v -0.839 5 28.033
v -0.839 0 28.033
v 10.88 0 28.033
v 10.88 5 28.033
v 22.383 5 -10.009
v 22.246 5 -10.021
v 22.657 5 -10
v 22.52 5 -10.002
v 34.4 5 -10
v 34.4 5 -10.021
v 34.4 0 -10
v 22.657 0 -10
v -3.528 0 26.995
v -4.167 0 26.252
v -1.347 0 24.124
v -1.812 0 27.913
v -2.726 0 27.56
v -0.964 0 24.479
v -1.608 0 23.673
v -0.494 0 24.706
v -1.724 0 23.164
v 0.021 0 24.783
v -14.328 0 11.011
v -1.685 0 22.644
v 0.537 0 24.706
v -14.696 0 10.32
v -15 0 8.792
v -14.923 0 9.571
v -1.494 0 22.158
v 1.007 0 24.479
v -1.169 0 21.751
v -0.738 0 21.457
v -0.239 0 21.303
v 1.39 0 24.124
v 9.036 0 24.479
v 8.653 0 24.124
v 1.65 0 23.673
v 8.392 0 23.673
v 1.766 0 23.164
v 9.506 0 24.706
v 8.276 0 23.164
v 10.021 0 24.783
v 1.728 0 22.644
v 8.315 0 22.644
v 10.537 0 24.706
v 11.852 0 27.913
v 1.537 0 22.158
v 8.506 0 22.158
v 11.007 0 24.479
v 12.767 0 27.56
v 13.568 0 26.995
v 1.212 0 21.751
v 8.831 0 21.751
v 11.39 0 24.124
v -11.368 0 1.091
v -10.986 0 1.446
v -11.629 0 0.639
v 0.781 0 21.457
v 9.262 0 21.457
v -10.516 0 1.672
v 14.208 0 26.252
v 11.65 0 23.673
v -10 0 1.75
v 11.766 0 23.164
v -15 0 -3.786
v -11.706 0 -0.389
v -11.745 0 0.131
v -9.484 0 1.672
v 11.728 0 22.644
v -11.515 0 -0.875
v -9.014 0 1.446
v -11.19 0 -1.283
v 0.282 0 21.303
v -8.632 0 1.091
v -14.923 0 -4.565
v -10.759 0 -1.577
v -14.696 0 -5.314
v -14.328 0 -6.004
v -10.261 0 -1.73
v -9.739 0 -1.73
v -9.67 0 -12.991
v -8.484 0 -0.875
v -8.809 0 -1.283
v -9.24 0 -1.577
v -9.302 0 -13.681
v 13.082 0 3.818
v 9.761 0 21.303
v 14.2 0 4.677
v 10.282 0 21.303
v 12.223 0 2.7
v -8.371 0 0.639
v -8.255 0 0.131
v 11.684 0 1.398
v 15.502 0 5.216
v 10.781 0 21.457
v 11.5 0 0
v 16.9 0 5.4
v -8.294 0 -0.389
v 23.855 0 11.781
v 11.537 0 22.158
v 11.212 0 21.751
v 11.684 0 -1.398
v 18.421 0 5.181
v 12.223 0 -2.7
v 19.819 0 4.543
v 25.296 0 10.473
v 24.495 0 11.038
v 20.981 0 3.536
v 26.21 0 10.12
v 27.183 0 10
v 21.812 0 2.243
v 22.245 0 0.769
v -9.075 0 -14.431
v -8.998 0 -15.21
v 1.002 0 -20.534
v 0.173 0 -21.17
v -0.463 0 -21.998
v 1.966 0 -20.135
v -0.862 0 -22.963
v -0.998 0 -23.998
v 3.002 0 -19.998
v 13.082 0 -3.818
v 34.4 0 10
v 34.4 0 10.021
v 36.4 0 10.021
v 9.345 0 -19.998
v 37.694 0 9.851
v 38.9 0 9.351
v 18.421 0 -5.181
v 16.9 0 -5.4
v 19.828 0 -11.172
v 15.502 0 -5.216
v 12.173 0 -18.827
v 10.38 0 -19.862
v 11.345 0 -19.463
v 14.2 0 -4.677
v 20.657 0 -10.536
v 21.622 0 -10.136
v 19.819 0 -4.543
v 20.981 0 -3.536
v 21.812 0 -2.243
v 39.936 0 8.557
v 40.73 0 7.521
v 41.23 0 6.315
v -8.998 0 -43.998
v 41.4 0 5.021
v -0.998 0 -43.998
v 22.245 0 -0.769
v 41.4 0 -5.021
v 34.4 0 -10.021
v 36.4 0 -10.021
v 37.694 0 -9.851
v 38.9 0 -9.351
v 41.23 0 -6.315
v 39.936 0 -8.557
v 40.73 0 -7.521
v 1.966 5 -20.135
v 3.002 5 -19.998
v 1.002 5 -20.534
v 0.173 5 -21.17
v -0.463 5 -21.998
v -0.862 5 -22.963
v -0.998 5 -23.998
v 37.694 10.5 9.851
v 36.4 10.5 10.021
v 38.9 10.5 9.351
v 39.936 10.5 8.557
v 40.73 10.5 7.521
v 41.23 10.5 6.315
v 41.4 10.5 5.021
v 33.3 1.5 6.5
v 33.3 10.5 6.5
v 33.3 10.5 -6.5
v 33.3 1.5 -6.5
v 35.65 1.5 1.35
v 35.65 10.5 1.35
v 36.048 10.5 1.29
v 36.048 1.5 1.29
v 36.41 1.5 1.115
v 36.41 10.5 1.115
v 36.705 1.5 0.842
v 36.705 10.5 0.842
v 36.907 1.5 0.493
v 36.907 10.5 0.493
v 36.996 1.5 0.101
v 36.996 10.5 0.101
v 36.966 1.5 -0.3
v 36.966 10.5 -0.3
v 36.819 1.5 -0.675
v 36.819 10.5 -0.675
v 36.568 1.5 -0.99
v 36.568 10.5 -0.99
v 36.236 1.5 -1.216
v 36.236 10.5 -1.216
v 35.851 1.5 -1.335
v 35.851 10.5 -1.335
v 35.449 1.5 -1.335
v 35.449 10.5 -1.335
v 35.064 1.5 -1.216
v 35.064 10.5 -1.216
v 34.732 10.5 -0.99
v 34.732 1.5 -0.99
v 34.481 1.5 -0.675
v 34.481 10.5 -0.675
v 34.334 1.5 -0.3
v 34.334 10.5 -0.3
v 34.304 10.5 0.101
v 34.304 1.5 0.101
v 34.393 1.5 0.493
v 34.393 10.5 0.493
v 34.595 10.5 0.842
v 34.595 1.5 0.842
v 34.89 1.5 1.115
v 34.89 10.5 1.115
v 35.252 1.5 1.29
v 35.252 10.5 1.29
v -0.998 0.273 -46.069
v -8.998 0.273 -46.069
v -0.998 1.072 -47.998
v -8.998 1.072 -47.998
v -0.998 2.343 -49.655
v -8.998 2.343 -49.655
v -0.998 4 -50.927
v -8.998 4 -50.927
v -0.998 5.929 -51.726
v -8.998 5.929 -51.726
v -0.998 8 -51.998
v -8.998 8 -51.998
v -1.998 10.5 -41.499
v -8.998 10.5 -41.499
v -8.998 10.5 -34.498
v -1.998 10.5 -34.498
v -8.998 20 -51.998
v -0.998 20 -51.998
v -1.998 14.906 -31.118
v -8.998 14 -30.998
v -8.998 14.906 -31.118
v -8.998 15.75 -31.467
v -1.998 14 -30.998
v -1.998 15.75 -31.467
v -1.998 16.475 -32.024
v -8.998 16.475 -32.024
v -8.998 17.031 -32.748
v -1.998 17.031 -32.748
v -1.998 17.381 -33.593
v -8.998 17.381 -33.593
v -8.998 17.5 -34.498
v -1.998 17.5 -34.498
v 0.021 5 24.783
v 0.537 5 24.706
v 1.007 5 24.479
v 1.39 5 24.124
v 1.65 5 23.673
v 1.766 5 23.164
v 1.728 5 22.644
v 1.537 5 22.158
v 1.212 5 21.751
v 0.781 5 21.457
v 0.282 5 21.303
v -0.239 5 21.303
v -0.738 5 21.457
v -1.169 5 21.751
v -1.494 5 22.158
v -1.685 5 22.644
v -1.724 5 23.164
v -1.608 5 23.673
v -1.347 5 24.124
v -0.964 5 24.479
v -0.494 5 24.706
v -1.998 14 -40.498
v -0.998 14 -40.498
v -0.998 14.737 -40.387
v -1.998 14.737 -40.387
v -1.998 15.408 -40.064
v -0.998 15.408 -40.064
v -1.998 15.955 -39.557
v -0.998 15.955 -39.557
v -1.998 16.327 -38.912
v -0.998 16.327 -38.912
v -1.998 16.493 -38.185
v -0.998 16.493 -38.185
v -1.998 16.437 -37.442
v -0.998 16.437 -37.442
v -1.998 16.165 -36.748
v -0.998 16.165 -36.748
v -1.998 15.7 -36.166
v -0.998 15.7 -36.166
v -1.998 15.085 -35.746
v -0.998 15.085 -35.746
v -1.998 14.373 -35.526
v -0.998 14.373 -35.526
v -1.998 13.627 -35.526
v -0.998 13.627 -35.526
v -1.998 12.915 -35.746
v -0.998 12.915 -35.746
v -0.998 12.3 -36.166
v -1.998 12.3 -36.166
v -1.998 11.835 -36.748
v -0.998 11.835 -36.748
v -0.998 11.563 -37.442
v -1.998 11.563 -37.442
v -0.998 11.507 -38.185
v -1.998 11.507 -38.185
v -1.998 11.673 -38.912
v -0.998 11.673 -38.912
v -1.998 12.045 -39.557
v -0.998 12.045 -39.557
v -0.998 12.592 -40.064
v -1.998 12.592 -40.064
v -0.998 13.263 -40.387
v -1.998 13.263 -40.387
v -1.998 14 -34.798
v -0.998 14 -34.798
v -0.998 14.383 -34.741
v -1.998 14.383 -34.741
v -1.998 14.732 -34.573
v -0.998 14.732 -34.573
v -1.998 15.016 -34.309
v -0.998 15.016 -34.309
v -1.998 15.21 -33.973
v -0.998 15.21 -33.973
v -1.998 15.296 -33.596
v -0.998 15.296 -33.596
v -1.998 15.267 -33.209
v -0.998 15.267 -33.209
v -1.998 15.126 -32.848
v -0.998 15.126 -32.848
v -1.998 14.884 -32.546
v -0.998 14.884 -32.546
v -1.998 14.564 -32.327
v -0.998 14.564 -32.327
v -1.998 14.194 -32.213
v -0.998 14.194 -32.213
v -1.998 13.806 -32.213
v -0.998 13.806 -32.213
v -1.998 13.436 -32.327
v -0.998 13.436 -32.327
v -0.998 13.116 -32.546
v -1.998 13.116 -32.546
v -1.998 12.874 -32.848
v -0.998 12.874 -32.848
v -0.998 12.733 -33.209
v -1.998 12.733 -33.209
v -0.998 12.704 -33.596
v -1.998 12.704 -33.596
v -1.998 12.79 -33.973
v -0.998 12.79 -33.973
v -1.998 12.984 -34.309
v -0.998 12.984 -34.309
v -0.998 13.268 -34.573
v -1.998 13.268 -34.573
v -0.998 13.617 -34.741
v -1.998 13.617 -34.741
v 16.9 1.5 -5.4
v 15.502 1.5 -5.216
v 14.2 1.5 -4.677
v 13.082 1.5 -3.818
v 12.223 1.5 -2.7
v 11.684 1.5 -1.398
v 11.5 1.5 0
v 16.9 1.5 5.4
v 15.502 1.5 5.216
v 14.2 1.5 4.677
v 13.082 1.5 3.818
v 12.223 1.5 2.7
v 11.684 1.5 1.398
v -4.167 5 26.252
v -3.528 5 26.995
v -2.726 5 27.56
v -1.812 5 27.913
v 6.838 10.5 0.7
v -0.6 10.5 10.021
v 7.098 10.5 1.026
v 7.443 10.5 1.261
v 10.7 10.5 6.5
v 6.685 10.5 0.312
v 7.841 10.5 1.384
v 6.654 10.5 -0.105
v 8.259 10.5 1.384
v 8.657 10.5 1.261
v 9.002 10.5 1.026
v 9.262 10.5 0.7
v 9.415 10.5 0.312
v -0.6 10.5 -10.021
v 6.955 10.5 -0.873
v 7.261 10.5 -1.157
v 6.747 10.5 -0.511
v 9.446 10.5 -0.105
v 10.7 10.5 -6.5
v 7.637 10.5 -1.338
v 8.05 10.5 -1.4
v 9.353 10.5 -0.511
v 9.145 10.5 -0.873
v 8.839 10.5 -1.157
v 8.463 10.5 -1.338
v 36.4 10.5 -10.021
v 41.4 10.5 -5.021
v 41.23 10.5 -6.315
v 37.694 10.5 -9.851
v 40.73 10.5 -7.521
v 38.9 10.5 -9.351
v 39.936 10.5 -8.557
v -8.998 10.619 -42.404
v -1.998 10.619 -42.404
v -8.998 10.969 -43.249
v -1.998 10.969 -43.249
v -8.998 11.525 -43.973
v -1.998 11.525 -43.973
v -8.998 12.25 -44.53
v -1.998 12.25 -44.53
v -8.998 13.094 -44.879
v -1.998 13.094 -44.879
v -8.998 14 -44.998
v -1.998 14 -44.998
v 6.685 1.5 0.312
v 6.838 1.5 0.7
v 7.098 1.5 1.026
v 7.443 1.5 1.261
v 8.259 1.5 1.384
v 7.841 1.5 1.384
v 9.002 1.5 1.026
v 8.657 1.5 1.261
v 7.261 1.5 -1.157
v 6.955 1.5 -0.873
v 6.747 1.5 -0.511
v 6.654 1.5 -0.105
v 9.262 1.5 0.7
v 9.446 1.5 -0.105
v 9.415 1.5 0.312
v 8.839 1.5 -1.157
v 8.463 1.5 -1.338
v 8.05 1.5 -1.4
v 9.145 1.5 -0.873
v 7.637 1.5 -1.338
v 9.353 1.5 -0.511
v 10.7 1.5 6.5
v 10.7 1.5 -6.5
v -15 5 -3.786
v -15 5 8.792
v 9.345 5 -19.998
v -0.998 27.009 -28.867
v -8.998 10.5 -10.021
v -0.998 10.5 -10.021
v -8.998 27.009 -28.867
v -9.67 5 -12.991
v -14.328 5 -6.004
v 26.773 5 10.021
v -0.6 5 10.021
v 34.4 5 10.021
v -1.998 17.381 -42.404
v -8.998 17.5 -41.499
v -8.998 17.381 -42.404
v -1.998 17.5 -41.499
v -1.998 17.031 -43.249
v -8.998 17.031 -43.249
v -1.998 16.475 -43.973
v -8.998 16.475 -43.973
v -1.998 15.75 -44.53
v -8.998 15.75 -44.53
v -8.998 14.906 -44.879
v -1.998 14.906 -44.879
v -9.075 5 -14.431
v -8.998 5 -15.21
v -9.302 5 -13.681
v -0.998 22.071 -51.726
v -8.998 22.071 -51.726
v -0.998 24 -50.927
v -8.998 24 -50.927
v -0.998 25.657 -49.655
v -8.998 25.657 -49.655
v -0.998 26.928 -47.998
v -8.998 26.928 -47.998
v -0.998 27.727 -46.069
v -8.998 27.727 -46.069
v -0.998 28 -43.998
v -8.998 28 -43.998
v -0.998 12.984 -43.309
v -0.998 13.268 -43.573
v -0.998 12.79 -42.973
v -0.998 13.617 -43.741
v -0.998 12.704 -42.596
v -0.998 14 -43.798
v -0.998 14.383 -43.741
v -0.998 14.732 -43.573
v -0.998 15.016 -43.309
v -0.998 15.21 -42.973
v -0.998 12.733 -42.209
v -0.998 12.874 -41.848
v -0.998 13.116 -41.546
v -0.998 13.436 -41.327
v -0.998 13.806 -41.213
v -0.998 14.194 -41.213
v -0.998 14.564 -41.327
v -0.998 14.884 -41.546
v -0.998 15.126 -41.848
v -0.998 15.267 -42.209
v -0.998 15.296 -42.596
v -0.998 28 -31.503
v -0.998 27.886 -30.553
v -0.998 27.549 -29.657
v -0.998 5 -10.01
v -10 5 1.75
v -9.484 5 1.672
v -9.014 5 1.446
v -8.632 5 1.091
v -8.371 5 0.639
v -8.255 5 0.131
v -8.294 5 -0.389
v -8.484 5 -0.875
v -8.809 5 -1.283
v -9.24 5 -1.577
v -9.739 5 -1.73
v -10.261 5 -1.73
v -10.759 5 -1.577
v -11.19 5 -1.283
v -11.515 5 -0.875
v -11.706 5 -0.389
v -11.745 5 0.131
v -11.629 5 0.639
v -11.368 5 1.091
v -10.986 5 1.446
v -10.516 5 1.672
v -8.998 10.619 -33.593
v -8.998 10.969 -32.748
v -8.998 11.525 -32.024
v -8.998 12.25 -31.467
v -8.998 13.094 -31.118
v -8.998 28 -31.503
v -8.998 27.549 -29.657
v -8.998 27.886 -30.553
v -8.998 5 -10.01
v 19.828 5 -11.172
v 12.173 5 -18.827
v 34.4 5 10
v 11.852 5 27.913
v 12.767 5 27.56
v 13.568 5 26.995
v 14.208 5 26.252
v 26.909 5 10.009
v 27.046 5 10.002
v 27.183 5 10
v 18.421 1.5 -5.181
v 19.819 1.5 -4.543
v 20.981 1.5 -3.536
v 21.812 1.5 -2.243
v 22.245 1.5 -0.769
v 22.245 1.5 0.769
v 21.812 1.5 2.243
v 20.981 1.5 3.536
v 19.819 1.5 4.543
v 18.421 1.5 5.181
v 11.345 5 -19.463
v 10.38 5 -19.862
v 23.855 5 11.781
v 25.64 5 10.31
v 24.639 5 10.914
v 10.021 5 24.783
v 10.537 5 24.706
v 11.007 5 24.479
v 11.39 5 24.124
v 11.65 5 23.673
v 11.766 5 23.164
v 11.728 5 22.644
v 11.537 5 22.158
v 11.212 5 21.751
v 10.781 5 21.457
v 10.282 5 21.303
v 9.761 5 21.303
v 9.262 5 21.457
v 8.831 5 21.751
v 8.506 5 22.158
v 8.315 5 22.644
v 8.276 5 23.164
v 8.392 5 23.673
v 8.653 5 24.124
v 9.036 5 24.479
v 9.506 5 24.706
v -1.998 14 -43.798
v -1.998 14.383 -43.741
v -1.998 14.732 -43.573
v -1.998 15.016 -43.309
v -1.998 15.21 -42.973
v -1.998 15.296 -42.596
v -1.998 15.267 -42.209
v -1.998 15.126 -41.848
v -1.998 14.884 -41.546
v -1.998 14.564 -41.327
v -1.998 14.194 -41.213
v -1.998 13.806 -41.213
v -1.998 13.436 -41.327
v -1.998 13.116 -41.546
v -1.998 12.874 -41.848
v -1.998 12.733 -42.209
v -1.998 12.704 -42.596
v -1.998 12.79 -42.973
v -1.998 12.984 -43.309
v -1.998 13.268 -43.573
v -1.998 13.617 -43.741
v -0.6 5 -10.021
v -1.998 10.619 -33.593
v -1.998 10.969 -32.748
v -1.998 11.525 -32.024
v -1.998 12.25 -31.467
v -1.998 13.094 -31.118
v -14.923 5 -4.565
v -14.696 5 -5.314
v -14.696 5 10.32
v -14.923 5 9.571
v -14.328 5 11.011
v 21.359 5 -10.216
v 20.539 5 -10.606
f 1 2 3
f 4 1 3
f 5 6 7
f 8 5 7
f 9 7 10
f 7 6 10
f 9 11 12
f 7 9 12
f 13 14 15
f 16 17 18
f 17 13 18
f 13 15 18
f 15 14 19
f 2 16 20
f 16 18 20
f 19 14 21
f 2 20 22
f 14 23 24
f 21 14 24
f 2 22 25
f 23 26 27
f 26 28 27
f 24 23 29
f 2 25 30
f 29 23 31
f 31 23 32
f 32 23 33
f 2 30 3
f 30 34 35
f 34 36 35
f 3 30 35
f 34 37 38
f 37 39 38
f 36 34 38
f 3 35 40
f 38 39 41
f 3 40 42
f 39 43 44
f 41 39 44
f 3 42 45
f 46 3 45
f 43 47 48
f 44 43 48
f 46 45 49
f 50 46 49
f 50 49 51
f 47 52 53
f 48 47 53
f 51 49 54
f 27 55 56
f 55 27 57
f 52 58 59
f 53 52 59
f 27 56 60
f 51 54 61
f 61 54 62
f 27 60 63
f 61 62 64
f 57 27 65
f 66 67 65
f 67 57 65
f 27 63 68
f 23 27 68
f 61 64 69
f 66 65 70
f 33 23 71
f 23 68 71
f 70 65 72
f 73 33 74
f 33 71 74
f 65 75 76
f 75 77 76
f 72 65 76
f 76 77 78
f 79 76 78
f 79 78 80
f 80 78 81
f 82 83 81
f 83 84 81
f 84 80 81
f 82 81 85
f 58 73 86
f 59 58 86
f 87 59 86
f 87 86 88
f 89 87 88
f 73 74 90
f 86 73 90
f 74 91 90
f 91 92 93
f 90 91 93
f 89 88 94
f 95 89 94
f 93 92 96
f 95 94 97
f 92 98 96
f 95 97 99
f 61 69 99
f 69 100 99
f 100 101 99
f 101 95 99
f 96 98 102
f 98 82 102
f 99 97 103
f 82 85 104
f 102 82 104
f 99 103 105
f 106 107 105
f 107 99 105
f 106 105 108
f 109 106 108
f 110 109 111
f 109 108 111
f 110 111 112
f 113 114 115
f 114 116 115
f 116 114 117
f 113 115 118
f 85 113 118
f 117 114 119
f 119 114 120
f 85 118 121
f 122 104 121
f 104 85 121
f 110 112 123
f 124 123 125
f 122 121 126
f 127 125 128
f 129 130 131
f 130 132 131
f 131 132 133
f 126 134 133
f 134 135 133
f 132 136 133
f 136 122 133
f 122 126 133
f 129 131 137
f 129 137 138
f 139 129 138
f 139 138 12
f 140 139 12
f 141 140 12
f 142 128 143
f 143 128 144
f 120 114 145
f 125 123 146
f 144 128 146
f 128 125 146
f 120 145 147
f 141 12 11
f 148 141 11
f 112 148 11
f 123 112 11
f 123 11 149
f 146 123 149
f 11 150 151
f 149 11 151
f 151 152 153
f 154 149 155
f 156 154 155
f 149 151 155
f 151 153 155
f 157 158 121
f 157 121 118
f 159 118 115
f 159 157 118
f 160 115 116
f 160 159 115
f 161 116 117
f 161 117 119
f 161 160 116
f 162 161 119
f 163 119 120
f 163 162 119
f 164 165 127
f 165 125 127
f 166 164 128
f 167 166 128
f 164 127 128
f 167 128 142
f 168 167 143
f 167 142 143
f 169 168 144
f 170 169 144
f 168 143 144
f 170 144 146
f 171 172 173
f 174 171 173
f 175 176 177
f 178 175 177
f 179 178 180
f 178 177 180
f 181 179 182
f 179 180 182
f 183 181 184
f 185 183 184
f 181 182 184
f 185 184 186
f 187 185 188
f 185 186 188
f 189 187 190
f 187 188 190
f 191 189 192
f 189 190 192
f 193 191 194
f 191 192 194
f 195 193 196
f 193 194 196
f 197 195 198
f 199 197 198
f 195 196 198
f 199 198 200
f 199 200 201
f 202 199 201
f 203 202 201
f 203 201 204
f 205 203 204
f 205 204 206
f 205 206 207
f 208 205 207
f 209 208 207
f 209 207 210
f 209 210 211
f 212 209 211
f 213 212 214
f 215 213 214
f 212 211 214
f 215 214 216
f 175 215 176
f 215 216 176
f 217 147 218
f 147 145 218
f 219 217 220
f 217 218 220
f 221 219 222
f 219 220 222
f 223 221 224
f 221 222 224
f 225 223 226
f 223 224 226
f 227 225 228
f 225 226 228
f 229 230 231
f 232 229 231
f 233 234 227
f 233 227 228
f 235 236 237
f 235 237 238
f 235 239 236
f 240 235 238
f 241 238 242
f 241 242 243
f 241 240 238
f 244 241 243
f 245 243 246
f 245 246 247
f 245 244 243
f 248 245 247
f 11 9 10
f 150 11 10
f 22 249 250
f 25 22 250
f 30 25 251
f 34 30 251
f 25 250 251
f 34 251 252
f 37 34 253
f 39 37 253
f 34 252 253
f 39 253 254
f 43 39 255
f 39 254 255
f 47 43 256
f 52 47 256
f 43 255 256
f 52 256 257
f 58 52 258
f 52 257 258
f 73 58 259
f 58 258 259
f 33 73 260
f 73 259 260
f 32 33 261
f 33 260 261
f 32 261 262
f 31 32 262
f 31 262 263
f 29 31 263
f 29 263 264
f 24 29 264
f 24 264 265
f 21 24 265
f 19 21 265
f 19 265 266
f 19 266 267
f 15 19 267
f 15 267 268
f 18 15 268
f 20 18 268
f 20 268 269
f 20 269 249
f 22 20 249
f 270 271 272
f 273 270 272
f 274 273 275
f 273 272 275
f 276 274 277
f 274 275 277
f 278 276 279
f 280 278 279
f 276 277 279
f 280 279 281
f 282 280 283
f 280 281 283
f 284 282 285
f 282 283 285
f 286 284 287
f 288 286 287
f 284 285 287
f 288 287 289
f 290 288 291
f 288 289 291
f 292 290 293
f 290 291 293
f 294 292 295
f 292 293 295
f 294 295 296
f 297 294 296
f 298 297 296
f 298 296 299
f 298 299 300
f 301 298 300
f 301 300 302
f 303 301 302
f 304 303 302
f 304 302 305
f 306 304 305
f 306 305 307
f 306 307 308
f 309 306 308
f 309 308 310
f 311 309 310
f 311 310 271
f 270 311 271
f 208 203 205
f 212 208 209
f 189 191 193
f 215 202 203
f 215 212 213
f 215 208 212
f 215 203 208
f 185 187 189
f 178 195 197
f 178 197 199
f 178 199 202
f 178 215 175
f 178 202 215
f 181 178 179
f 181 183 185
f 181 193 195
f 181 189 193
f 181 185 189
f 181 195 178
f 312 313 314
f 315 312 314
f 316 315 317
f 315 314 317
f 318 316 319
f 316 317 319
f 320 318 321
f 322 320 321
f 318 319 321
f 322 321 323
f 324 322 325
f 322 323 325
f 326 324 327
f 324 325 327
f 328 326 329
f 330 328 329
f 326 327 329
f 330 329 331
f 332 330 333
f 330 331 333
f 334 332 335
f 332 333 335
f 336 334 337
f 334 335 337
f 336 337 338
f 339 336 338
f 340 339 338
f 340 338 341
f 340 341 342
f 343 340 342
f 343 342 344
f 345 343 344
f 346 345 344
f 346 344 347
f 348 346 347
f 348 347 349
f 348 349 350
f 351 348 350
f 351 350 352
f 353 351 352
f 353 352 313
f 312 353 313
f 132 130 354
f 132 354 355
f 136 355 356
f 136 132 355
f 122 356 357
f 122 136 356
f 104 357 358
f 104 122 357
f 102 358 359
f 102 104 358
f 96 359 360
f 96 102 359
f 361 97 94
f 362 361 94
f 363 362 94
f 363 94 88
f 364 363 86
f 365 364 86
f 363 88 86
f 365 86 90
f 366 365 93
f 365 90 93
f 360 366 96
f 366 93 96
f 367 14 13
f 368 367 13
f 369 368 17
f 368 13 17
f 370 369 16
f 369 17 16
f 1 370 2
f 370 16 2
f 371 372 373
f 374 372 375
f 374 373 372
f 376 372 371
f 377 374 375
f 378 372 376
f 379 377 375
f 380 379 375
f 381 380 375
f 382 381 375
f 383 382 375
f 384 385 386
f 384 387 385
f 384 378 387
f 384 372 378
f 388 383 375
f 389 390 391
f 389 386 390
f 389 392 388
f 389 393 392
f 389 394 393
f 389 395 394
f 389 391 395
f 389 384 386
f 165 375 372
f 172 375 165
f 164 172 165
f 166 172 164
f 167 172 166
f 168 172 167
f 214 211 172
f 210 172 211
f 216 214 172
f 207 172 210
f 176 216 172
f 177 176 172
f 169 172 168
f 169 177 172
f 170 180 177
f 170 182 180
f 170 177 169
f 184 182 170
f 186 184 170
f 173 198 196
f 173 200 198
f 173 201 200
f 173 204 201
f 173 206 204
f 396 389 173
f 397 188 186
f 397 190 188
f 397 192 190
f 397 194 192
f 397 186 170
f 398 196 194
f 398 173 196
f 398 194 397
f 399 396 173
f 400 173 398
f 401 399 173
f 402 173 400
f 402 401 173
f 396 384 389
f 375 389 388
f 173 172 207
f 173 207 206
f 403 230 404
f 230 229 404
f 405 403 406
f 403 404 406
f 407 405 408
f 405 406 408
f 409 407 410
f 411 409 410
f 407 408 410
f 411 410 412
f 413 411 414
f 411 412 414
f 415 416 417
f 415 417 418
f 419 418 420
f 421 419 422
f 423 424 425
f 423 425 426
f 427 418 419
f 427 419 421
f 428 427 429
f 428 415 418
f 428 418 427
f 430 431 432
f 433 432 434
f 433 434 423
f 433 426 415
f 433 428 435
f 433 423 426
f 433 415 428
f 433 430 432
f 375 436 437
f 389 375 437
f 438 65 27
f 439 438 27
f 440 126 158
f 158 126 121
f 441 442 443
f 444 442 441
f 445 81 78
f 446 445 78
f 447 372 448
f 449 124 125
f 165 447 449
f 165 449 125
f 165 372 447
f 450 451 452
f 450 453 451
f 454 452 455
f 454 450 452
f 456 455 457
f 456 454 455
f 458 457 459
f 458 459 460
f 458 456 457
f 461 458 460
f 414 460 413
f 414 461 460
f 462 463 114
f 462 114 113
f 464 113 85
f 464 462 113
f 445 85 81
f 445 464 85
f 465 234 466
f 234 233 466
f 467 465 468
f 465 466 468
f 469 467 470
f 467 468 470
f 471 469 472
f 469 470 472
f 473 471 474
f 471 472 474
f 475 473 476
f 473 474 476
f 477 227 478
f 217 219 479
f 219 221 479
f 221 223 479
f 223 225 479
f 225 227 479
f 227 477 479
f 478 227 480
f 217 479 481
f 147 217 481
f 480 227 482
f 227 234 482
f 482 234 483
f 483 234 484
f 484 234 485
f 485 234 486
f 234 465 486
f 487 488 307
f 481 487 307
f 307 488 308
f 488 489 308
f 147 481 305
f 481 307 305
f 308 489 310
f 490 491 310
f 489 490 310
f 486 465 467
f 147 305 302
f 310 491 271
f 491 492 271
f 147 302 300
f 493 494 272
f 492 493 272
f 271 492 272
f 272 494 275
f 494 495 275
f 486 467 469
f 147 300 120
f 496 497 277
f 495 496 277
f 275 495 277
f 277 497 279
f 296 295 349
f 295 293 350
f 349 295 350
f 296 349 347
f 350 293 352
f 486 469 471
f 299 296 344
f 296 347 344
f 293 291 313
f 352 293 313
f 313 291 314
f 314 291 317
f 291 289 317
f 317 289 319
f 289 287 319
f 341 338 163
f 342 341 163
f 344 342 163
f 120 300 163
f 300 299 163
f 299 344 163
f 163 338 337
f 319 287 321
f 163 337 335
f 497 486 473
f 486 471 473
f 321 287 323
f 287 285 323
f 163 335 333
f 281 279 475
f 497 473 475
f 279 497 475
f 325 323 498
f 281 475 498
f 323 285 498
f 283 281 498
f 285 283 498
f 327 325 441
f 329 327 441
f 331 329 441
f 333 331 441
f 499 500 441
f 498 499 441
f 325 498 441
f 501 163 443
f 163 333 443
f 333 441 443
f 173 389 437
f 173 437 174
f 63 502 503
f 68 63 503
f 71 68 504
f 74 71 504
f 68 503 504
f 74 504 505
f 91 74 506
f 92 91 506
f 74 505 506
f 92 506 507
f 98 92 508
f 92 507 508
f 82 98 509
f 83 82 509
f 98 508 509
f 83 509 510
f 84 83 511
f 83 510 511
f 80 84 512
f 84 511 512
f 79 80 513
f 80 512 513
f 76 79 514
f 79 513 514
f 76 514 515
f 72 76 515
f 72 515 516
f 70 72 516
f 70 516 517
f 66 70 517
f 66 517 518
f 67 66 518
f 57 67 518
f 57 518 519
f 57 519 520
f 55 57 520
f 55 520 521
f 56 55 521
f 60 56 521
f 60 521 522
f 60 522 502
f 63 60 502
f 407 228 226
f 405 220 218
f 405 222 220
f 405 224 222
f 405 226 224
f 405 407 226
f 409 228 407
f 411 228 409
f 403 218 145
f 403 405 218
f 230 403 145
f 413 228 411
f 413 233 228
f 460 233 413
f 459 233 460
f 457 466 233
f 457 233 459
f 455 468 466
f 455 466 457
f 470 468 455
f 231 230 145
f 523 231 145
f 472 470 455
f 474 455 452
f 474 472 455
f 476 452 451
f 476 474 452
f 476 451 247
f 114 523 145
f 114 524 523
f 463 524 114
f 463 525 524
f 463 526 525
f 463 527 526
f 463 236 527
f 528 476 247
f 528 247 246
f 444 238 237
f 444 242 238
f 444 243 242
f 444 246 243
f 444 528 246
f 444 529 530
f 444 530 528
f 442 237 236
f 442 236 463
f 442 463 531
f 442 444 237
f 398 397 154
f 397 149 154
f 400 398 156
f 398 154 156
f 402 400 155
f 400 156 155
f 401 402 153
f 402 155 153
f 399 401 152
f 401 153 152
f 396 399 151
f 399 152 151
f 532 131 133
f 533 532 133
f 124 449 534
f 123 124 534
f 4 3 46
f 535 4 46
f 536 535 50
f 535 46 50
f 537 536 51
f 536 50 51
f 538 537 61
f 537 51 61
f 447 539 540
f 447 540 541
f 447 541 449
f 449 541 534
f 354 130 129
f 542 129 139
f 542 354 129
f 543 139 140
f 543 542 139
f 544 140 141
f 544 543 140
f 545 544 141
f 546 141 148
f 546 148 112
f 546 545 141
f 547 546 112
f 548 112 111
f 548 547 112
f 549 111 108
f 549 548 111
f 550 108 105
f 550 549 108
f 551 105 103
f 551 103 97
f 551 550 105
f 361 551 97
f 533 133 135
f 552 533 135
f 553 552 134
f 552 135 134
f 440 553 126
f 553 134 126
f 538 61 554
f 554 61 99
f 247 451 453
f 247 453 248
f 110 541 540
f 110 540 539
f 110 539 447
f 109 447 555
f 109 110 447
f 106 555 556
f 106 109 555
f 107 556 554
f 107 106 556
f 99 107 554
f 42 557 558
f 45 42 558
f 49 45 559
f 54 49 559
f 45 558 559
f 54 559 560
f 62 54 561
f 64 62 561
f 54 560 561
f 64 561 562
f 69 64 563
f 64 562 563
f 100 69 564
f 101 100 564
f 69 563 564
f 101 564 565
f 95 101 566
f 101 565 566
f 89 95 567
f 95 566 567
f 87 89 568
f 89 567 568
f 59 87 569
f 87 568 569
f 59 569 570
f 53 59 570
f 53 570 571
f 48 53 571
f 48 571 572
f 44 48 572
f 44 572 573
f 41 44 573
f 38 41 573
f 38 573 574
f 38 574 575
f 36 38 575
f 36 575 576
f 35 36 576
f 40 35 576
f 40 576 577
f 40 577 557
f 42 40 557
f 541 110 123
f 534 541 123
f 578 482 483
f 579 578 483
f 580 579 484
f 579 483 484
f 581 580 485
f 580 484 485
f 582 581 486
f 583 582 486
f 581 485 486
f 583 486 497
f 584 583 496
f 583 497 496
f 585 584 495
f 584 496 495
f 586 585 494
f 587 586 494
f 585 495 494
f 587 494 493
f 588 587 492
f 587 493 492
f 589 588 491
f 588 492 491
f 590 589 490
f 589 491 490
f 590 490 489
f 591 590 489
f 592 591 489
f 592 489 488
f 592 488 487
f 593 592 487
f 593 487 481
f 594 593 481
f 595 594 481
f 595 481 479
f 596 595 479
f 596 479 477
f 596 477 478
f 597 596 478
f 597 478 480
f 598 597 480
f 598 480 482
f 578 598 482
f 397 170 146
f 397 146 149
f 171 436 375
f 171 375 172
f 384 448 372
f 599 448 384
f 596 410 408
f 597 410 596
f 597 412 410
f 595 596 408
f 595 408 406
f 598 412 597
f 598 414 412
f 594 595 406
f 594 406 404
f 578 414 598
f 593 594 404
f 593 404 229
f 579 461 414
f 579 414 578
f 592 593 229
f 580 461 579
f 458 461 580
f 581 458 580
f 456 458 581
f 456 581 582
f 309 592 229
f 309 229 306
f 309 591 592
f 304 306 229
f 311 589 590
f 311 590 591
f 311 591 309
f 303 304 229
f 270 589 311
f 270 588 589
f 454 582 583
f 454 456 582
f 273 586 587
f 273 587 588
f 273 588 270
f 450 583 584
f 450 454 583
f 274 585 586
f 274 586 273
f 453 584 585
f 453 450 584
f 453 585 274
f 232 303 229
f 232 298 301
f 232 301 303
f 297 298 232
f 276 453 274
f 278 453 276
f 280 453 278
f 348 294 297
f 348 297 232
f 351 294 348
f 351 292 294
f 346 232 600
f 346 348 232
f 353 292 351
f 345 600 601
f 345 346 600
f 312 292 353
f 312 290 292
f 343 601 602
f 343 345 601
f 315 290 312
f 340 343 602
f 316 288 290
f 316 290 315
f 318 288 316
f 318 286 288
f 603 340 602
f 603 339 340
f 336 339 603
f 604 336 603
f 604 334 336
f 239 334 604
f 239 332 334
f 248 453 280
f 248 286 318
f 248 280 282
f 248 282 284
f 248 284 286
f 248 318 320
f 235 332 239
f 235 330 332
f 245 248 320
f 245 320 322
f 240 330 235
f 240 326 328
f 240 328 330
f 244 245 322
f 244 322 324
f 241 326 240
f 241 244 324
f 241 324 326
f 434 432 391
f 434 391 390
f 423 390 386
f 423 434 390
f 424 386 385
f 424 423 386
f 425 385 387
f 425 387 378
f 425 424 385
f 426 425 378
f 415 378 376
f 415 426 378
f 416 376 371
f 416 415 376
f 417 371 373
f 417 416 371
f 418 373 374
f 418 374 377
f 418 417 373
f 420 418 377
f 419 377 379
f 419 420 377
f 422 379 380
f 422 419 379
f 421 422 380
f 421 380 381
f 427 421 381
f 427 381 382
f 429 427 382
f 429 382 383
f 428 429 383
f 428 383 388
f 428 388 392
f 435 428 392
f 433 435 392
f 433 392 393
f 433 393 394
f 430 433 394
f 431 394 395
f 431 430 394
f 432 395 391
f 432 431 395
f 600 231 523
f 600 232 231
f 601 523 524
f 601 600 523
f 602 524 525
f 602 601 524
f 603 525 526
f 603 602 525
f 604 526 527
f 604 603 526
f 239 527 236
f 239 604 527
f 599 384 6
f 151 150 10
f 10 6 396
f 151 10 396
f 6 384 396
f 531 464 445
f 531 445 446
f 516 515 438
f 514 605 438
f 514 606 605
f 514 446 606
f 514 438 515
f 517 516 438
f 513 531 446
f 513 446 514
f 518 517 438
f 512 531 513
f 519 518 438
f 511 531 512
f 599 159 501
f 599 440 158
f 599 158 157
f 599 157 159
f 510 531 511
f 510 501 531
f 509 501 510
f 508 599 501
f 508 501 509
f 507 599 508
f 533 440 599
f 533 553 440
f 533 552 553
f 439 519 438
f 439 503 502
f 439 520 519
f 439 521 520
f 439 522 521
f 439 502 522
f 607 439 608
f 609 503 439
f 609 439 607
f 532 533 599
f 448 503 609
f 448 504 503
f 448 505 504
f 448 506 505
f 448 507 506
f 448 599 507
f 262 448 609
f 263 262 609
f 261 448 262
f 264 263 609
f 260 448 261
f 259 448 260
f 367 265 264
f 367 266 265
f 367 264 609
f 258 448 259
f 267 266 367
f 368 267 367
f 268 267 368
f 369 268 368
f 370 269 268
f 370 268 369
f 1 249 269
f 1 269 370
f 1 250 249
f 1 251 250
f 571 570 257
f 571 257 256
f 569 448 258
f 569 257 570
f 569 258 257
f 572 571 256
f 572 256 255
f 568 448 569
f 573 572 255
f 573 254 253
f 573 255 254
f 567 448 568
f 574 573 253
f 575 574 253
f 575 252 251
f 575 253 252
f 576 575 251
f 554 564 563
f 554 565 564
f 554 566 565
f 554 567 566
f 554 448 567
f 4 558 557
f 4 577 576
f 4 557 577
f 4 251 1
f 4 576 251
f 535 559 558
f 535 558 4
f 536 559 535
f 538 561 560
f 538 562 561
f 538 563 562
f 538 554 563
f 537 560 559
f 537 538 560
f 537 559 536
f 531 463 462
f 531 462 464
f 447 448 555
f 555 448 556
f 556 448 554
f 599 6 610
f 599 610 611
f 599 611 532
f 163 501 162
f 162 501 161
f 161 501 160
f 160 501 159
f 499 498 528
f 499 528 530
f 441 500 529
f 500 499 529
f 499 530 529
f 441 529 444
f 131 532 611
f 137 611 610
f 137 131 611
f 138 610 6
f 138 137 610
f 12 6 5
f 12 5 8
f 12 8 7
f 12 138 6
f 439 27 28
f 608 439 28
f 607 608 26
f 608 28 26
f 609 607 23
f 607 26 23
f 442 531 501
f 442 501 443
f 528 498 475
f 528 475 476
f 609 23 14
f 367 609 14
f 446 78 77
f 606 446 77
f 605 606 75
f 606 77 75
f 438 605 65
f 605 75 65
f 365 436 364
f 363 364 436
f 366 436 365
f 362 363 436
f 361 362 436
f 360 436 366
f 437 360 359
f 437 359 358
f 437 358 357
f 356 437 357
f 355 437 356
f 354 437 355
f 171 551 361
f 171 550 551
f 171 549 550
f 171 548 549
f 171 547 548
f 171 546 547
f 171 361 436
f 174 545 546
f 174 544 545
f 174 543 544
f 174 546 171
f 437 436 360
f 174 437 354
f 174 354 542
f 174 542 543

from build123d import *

# Parameters (mm, degrees)
BOSS_EXTRUDE1_DEPTH = 5
SKETCH2_R           = 1.75
SKETCH2_W           = 10.8
SKETCH2_H           = 10.8
CUT_EXTRUDE1_DEPTH  = 54.252895531
FILLET1_R           = 5.4
FILLET2_R           = 5.4
FILLET3_RADIUS      = 10
FILLET3_LENGTH      = 5
SKETCH6_W           = 35
SKETCH6_H           = 20.042215846
SKETCH6_W_2         = 23
SKETCH6_H_2         = 13
BOSS_EXTRUDE3_DEPTH = 5.5
SKETCH7_W           = 23
SKETCH7_H           = 13
CUT_EXTRUDE3_DEPTH  = 3.5
CUT_EXTRUDE4_DEPTH  = 54.302165833
SKETCH9_W           = 8
SKETCH9_H           = 28
BOSS_EXTRUDE4_DEPTH = 32
SKETCH11_R          = 2.5
SKETCH11_R_2        = 1.3
CUT_EXTRUDE5_DEPTH  = 69.854164991
FILLET6_R           = 8
BOSS_EXTRUDE5_DEPTH = 8
SKETCH13_W          = 14
SKETCH13_H          = 7
CUT_EXTRUDE6_DEPTH  = 7
FILLET7_R           = 3.5
FILLET8_R           = 3.5
CUT_EXTRUDE7_DEPTH  = 74.28896148
FILLET9_R           = 4
SKETCH15_W          = 5.3
SKETCH15_H          = 13
SKETCH15_R          = 1.4
BOSS_EXTRUDE6_DEPTH = 9
SKETCH16_W          = 7
SKETCH16_H          = 20.042215846
BOSS_EXTRUDE7_DEPTH = 10.5
SKETCH17_R          = 1.35
CUT_EXTRUDE8_DEPTH  = 9
FILLET10_R          = 5
SKETCH18_W          = 4.9
SKETCH18_H          = 13
CUT_EXTRUDE9_DEPTH  = 9


# Some blends are built 0.0001 mm under size
with BuildPart() as part:
    # Sketch1 → Boss-Extrude1 (new body)
    with BuildSketch(Plane(origin=(0, 0, 0), x_dir=(1, 0, 0), z_dir=(0, 1, 0))):
        Polygon((45, -10), (45, 10), (21, 10), (11.001510114, 19.998489886), (-4.998489886, 19.998489886), (-14.999716743, 4.996611292), (-14.999716743, -10.003388708), (-2.979747437, -28.033388708), (13.020252563, -28.033388708), (25.042481003, -10), align=None)
    extrude(amount=BOSS_EXTRUDE1_DEPTH)

    # Sketch2 → Cut-Extrude1 (cut, through all)
    with BuildSketch(Plane(origin=(0, 5, 0), x_dir=(1, 0, 0), z_dir=(0, 1, 0))):
        with Locations(Location((-9.999716743, 0, 0), (0, 0, 270))):
            Circle(SKETCH2_R)
        with Locations(Location((0.02138213, -23.033388708, 0), (0, 0, 270))):
            Circle(SKETCH2_R)
        with Locations(Location((10.02138213, -23.033388708, 0), (0, 0, 270))):
            Circle(SKETCH2_R)
        with Locations((16.9, 0)):
            Rectangle(SKETCH2_W, SKETCH2_H)
    extrude(amount=-CUT_EXTRUDE1_DEPTH, mode=Mode.SUBTRACT)

    # Fillet1
    fillet1_edges = [part.edges().sort_by_distance(p)[0] for p in [
        (11.5, 2.5, 5.4),
        (11.5, 2.5, -5.4),
    ]]
    fillet(fillet1_edges, radius=FILLET1_R - 0.0001)  # a hair under: the kernel refuses the full size

    # Fillet2
    # the kernel refuses this fillet: 5.4 mm, written as the material it adds along each edge
    with BuildSketch(Plane(origin=(22.3, 5, 5.4), x_dir=(-1, 0, 0), z_dir=(0, -1, 0)), Plane(origin=(22.3, 5, -5.4), x_dir=(0, 0, 1), z_dir=(0, -1, 0))) as fillet2_piece_1:
        with BuildLine():
            CenterArc((FILLET2_R, FILLET2_R), FILLET2_R, 180, 90)
            Line((0, FILLET2_R), (0, 0))
            Line((0, 0), (FILLET2_R, 0))
        make_face()
    extrude(amount=5)
    # the kernel refuses this fillet: 5.4 mm, written as the material it takes off along each edge

    # Fillet3: full round fillet: the end face becomes a half cylinder, R = half its width
    fillet3_face = Plane((45, 2.5, 0), x_dir=(0, 1, 0), z_dir=(1, 0, 0))  # on the end face: x along it, z out of the body
    fillet3_slab = fillet3_face.offset(-FILLET3_RADIUS / 2) * Box(FILLET3_LENGTH, 2 * FILLET3_RADIUS, FILLET3_RADIUS, mode=Mode.PRIVATE)  # the body's end, R deep
    fillet3_round = Plane((35, 2.5, 0), x_dir=(1, 0, 0), z_dir=(0, 1, 0)) * Cylinder(FILLET3_RADIUS, FILLET3_LENGTH, mode=Mode.PRIVATE)  # its axis R under the face
    add(fillet3_slab - fillet3_round, mode=Mode.SUBTRACT)

    # Sketch6 → Boss-Extrude3 (add)
    with BuildSketch(Plane(origin=(0, 5, 0), x_dir=(1, 0, 0), z_dir=(0, 1, 0))):
        with Locations((16.9, 0)):
            Rectangle(SKETCH6_W, SKETCH6_H)
        with Locations((16.9, 0)):
            Rectangle(SKETCH6_W_2, SKETCH6_H_2, mode=Mode.SUBTRACT)
    extrude(amount=BOSS_EXTRUDE3_DEPTH)

    # Sketch7 → Cut-Extrude3 (cut)
    with BuildSketch(Plane(origin=(0, 5, 0), x_dir=(1, 0, 0), z_dir=(0, 1, 0))):
        with Locations((16.9, 0)):
            Rectangle(SKETCH7_W, SKETCH7_H)
    extrude(amount=-CUT_EXTRUDE3_DEPTH, mode=Mode.SUBTRACT)

    # Sketch8 → Cut-Extrude4 (cut, through all)
    with BuildSketch(Plane(origin=(0, 5, 0), x_dir=(1, 0, 0), z_dir=(0, 1, 0))):
        with BuildLine():
            Line((34.4, 10), (34.4, -10))
            Line((34.4, -10), (35, -10))
            ThreePointArc((35, -10), (45, 0), (35, 10))
            Line((35, 10), (34.4, 10))
        make_face()
    extrude(amount=-CUT_EXTRUDE4_DEPTH, mode=Mode.SUBTRACT)

    # Sketch9 → Boss-Extrude4 (add)
    with BuildSketch(Plane(origin=(0, 0, -19.998489886), x_dir=(-1, 0, 0), z_dir=(0, 0, -1))):
        with Locations((4.998489886, 14)):
            Rectangle(SKETCH9_W, SKETCH9_H)
    extrude(amount=BOSS_EXTRUDE4_DEPTH)

    # Sketch11 → Cut-Extrude5 (cut, through all)
    with BuildSketch(Plane(origin=(-0.998489886, 0, 0), x_dir=(0, 0, -1), z_dir=(1, 0, 0))):
        with Locations((37.998489886, 14)):
            Circle(SKETCH11_R)
        with Locations((33.498489886, 14)):
            Circle(SKETCH11_R_2)
        with Locations((42.498489886, 14)):
            Circle(SKETCH11_R_2)
    extrude(amount=-CUT_EXTRUDE5_DEPTH, mode=Mode.SUBTRACT)

    # Fillet6
    fillet6_edges = [part.edges().sort_by_distance(p)[0] for p in [
        (-4.998489886, 0, -51.998489886),
        (-4.998489886, 28, -51.998489886),
    ]]
    fillet(fillet6_edges, radius=FILLET6_R)

    # Sketch12 → Boss-Extrude5 (add)
    with BuildSketch(Plane.ZY.offset(8.998489886)):
        Polygon((-10.021107923, 10.5), (-19.998489886, 28), (-19.998489886, 0), (-10, 0), align=None)
    extrude(amount=-BOSS_EXTRUDE5_DEPTH)

    # Sketch13 → Cut-Extrude6 (cut)
    with BuildSketch(Plane.ZY.offset(8.998489886)):
        with Locations((-37.998489886, 14)):
            Rectangle(SKETCH13_W, SKETCH13_H)
    extrude(amount=-CUT_EXTRUDE6_DEPTH, mode=Mode.SUBTRACT)

    # Fillet7
    fillet7_edges = [part.edges().sort_by_distance(p)[0] for p in [
        (-5.498489886, 10.5, -44.998489886),
        (-5.498489886, 17.5, -44.998489886),
    ]]
    fillet(fillet7_edges, radius=FILLET7_R - 0.0001)  # a hair under: the kernel refuses the full size

    # Fillet8
    fillet8_edges = [part.edges().sort_by_distance(p)[0] for p in [
        (-5.498489886, 17.5, -30.998489886),
        (-5.498489886, 10.5, -30.998489886),
    ]]
    fillet(fillet8_edges, radius=FILLET8_R - 0.0001)  # a hair under: the kernel refuses the full size

    # Sketch14 → Cut-Extrude7 (cut, through all)
    with BuildSketch(Plane.ZY.offset(8.998489886)):
        Polygon((-10.021107923, 10.5), (-29.998489886, 28), (-19.998489886, 28), align=None)
    extrude(amount=-CUT_EXTRUDE7_DEPTH, mode=Mode.SUBTRACT)

    # Fillet9
    # the kernel refuses this fillet: 4 mm, written as the material it adds along each edge
    with BuildSketch(Plane(origin=(-0.998489886, 5, -19.998489886), x_dir=(1, 0, 0), z_dir=(0, -1, 0))) as fillet9_piece_1:
        with BuildLine():
            CenterArc((FILLET9_R, -FILLET9_R), FILLET9_R, 90, 90)
            Line((0, -FILLET9_R), (0, 0))
            Line((0, 0), (FILLET9_R, 0))
        make_face()
    extrude(amount=5)
    with BuildSketch(Plane(origin=(25.042481003, 0, 10), x_dir=(-0.5546992156114033, 0, 0.8320509480795595), z_dir=(0, 1, 0))) as fillet9_piece_2:
        with BuildLine():
            CenterArc((FILLET9_R * 0.535184516545, FILLET9_R), FILLET9_R, 213.69, 56.31)
            Line((-FILLET9_R * 0.296866431535, FILLET9_R * 0.445300784389), (0, 0))
            Line((0, 0), (FILLET9_R * 0.535184516545, 0))
        make_face()
    extrude(amount=5)
    with BuildSketch(Plane(origin=(21, 0, -10), x_dir=(1, 0, 0), z_dir=(0, 1, 0))) as fillet9_piece_3:
        with BuildLine():
            CenterArc((FILLET9_R * 0.414213562373, FILLET9_R), FILLET9_R, 225, 45)
            Line((-FILLET9_R * 0.292893218813, FILLET9_R * 0.292893218813), (0, 0))
            Line((0, 0), (FILLET9_R * 0.414213562373, 0))
        make_face()
    extrude(amount=5)
    with BuildSketch(Plane(origin=(-8.998489886, 5, -13.998474565), x_dir=(0, 0, -1), z_dir=(0, -1, 0))) as fillet9_piece_4:
        with BuildLine():
            CenterArc((FILLET9_R * 0.302774994436, -FILLET9_R), FILLET9_R, 90, 33.69)
            Line((-FILLET9_R * 0.251924221175, -FILLET9_R * 0.16794905192), (0, 0))
            Line((0, 0), (FILLET9_R * 0.302774994436, 0))
        make_face()
    extrude(amount=5)
    # the kernel refuses this fillet: 4 mm, written as the material it takes off along each edge
    with BuildSketch(Plane(origin=(13.020252563, -5.351845165, 28.033388708), x_dir=(0.5546992156114035, 0, -0.8320509480795594), z_dir=(0, 1, 0)), Plane(origin=(-2.979747437, -5.351845165, 28.033388708), x_dir=(1, 0, 0), z_dir=(0, 1, 0))) as fillet9_2_piece_1:
        with BuildLine():
            CenterArc((FILLET9_R * 0.535184516545, FILLET9_R), FILLET9_R, 213.69, 56.31)
            Line((-FILLET9_R * 0.296866431535, FILLET9_R * 0.445300784389), (0, 0))
            Line((0, 0), (FILLET9_R * 0.535184516545, 0))
        make_face()
    extrude(amount=15.703690331, mode=Mode.SUBTRACT)
    with BuildSketch(Plane(origin=(-14.999716743, -3.027749944, 10.003388708), x_dir=(0.5546992156114036, 0, 0.8320509480795593), z_dir=(0, 1, 0)), Plane(origin=(-14.999716743, -3.027749944, -4.996611292), x_dir=(0, 0, 1), z_dir=(0, 1, 0))) as fillet9_2_piece_2:
        with BuildLine():
            CenterArc((FILLET9_R * 0.302774994436, FILLET9_R), FILLET9_R, 236.31, 33.69)
            Line((-FILLET9_R * 0.251924221175, FILLET9_R * 0.16794905192), (0, 0))
            Line((0, 0), (FILLET9_R * 0.302774994436, 0))
        make_face()
    extrude(amount=11.055499889, mode=Mode.SUBTRACT)
    with BuildSketch(Plane(origin=(11.001510114, -4.142135624, -19.998489886), x_dir=(-1, 0, 0), z_dir=(0, 1, 0))) as fillet9_2_piece_3:
        with BuildLine():
            CenterArc((FILLET9_R * 0.414213562373, FILLET9_R), FILLET9_R, 225, 45)
            Line((-FILLET9_R * 0.292893218813, FILLET9_R * 0.292893218813), (0, 0))
            Line((0, 0), (FILLET9_R * 0.414213562373, 0))
        make_face()
    extrude(amount=13.284271247, mode=Mode.SUBTRACT)
    with BuildSketch(Plane(origin=(-12.759041279, 28, -29.998489886), x_dir=(0, -0.658926553885557, 0.7522072829908683), z_dir=(1, 0, 0))) as fillet9_2_piece_4:
        with BuildLine():
            CenterArc((FILLET9_R * 0.376055139299, FILLET9_R), FILLET9_R, 228.781943012, 41.218056988)
            Line((-FILLET9_R * 0.282871414587, FILLET9_R * 0.247792717009), (0, 0))
            Line((0, 0), (FILLET9_R * 0.376055139299, 0))
        make_face()
    extrude(amount=15.521102786, mode=Mode.SUBTRACT)

    # Sketch15 → Boss-Extrude6 (add)
    with BuildSketch(Plane(origin=(0, 1.5, 0), x_dir=(1, 0, 0), z_dir=(0, 1, 0))):
        with Locations((8.05, 0)):
            Rectangle(SKETCH15_W, SKETCH15_H)
        with Locations(Location((8.05, 0, 0), (0, 0, 90))):
            Circle(SKETCH15_R, mode=Mode.SUBTRACT)
    extrude(amount=BOSS_EXTRUDE6_DEPTH)

    # Sketch16 → Boss-Extrude7 (add)
    with BuildSketch(Plane(origin=(0, 10.5, 0), x_dir=(1, 0, 0), z_dir=(0, 1, 0))):
        with Locations((37.9, 0)):
            Rectangle(SKETCH16_W, SKETCH16_H)
    extrude(amount=-BOSS_EXTRUDE7_DEPTH)

    # Sketch17 → Cut-Extrude8 (cut)
    with BuildSketch(Plane(origin=(0, 10.5, 0), x_dir=(1, 0, 0), z_dir=(0, 1, 0))):
        with Locations(Location((35.65, 0, 0), (0, 0, 270))):
            Circle(SKETCH17_R)
    extrude(amount=-CUT_EXTRUDE8_DEPTH, mode=Mode.SUBTRACT)

    # Fillet10
    fillet10_edges = [part.edges().sort_by_distance(p)[0] for p in [
        (41.4, 5.25, -10.021107923),
        (41.4, 5.25, 10.021107923),
    ]]
    fillet(fillet10_edges, radius=FILLET10_R)

    # Sketch18 → Cut-Extrude9 (cut)
    with BuildSketch(Plane(origin=(0, 10.5, 0), x_dir=(1, 0, 0), z_dir=(0, 1, 0))):
        with Locations((30.85, 0)):
            Rectangle(SKETCH18_W, SKETCH18_H)
    extrude(amount=-CUT_EXTRUDE9_DEPTH, mode=Mode.SUBTRACT)


solid = part.part
